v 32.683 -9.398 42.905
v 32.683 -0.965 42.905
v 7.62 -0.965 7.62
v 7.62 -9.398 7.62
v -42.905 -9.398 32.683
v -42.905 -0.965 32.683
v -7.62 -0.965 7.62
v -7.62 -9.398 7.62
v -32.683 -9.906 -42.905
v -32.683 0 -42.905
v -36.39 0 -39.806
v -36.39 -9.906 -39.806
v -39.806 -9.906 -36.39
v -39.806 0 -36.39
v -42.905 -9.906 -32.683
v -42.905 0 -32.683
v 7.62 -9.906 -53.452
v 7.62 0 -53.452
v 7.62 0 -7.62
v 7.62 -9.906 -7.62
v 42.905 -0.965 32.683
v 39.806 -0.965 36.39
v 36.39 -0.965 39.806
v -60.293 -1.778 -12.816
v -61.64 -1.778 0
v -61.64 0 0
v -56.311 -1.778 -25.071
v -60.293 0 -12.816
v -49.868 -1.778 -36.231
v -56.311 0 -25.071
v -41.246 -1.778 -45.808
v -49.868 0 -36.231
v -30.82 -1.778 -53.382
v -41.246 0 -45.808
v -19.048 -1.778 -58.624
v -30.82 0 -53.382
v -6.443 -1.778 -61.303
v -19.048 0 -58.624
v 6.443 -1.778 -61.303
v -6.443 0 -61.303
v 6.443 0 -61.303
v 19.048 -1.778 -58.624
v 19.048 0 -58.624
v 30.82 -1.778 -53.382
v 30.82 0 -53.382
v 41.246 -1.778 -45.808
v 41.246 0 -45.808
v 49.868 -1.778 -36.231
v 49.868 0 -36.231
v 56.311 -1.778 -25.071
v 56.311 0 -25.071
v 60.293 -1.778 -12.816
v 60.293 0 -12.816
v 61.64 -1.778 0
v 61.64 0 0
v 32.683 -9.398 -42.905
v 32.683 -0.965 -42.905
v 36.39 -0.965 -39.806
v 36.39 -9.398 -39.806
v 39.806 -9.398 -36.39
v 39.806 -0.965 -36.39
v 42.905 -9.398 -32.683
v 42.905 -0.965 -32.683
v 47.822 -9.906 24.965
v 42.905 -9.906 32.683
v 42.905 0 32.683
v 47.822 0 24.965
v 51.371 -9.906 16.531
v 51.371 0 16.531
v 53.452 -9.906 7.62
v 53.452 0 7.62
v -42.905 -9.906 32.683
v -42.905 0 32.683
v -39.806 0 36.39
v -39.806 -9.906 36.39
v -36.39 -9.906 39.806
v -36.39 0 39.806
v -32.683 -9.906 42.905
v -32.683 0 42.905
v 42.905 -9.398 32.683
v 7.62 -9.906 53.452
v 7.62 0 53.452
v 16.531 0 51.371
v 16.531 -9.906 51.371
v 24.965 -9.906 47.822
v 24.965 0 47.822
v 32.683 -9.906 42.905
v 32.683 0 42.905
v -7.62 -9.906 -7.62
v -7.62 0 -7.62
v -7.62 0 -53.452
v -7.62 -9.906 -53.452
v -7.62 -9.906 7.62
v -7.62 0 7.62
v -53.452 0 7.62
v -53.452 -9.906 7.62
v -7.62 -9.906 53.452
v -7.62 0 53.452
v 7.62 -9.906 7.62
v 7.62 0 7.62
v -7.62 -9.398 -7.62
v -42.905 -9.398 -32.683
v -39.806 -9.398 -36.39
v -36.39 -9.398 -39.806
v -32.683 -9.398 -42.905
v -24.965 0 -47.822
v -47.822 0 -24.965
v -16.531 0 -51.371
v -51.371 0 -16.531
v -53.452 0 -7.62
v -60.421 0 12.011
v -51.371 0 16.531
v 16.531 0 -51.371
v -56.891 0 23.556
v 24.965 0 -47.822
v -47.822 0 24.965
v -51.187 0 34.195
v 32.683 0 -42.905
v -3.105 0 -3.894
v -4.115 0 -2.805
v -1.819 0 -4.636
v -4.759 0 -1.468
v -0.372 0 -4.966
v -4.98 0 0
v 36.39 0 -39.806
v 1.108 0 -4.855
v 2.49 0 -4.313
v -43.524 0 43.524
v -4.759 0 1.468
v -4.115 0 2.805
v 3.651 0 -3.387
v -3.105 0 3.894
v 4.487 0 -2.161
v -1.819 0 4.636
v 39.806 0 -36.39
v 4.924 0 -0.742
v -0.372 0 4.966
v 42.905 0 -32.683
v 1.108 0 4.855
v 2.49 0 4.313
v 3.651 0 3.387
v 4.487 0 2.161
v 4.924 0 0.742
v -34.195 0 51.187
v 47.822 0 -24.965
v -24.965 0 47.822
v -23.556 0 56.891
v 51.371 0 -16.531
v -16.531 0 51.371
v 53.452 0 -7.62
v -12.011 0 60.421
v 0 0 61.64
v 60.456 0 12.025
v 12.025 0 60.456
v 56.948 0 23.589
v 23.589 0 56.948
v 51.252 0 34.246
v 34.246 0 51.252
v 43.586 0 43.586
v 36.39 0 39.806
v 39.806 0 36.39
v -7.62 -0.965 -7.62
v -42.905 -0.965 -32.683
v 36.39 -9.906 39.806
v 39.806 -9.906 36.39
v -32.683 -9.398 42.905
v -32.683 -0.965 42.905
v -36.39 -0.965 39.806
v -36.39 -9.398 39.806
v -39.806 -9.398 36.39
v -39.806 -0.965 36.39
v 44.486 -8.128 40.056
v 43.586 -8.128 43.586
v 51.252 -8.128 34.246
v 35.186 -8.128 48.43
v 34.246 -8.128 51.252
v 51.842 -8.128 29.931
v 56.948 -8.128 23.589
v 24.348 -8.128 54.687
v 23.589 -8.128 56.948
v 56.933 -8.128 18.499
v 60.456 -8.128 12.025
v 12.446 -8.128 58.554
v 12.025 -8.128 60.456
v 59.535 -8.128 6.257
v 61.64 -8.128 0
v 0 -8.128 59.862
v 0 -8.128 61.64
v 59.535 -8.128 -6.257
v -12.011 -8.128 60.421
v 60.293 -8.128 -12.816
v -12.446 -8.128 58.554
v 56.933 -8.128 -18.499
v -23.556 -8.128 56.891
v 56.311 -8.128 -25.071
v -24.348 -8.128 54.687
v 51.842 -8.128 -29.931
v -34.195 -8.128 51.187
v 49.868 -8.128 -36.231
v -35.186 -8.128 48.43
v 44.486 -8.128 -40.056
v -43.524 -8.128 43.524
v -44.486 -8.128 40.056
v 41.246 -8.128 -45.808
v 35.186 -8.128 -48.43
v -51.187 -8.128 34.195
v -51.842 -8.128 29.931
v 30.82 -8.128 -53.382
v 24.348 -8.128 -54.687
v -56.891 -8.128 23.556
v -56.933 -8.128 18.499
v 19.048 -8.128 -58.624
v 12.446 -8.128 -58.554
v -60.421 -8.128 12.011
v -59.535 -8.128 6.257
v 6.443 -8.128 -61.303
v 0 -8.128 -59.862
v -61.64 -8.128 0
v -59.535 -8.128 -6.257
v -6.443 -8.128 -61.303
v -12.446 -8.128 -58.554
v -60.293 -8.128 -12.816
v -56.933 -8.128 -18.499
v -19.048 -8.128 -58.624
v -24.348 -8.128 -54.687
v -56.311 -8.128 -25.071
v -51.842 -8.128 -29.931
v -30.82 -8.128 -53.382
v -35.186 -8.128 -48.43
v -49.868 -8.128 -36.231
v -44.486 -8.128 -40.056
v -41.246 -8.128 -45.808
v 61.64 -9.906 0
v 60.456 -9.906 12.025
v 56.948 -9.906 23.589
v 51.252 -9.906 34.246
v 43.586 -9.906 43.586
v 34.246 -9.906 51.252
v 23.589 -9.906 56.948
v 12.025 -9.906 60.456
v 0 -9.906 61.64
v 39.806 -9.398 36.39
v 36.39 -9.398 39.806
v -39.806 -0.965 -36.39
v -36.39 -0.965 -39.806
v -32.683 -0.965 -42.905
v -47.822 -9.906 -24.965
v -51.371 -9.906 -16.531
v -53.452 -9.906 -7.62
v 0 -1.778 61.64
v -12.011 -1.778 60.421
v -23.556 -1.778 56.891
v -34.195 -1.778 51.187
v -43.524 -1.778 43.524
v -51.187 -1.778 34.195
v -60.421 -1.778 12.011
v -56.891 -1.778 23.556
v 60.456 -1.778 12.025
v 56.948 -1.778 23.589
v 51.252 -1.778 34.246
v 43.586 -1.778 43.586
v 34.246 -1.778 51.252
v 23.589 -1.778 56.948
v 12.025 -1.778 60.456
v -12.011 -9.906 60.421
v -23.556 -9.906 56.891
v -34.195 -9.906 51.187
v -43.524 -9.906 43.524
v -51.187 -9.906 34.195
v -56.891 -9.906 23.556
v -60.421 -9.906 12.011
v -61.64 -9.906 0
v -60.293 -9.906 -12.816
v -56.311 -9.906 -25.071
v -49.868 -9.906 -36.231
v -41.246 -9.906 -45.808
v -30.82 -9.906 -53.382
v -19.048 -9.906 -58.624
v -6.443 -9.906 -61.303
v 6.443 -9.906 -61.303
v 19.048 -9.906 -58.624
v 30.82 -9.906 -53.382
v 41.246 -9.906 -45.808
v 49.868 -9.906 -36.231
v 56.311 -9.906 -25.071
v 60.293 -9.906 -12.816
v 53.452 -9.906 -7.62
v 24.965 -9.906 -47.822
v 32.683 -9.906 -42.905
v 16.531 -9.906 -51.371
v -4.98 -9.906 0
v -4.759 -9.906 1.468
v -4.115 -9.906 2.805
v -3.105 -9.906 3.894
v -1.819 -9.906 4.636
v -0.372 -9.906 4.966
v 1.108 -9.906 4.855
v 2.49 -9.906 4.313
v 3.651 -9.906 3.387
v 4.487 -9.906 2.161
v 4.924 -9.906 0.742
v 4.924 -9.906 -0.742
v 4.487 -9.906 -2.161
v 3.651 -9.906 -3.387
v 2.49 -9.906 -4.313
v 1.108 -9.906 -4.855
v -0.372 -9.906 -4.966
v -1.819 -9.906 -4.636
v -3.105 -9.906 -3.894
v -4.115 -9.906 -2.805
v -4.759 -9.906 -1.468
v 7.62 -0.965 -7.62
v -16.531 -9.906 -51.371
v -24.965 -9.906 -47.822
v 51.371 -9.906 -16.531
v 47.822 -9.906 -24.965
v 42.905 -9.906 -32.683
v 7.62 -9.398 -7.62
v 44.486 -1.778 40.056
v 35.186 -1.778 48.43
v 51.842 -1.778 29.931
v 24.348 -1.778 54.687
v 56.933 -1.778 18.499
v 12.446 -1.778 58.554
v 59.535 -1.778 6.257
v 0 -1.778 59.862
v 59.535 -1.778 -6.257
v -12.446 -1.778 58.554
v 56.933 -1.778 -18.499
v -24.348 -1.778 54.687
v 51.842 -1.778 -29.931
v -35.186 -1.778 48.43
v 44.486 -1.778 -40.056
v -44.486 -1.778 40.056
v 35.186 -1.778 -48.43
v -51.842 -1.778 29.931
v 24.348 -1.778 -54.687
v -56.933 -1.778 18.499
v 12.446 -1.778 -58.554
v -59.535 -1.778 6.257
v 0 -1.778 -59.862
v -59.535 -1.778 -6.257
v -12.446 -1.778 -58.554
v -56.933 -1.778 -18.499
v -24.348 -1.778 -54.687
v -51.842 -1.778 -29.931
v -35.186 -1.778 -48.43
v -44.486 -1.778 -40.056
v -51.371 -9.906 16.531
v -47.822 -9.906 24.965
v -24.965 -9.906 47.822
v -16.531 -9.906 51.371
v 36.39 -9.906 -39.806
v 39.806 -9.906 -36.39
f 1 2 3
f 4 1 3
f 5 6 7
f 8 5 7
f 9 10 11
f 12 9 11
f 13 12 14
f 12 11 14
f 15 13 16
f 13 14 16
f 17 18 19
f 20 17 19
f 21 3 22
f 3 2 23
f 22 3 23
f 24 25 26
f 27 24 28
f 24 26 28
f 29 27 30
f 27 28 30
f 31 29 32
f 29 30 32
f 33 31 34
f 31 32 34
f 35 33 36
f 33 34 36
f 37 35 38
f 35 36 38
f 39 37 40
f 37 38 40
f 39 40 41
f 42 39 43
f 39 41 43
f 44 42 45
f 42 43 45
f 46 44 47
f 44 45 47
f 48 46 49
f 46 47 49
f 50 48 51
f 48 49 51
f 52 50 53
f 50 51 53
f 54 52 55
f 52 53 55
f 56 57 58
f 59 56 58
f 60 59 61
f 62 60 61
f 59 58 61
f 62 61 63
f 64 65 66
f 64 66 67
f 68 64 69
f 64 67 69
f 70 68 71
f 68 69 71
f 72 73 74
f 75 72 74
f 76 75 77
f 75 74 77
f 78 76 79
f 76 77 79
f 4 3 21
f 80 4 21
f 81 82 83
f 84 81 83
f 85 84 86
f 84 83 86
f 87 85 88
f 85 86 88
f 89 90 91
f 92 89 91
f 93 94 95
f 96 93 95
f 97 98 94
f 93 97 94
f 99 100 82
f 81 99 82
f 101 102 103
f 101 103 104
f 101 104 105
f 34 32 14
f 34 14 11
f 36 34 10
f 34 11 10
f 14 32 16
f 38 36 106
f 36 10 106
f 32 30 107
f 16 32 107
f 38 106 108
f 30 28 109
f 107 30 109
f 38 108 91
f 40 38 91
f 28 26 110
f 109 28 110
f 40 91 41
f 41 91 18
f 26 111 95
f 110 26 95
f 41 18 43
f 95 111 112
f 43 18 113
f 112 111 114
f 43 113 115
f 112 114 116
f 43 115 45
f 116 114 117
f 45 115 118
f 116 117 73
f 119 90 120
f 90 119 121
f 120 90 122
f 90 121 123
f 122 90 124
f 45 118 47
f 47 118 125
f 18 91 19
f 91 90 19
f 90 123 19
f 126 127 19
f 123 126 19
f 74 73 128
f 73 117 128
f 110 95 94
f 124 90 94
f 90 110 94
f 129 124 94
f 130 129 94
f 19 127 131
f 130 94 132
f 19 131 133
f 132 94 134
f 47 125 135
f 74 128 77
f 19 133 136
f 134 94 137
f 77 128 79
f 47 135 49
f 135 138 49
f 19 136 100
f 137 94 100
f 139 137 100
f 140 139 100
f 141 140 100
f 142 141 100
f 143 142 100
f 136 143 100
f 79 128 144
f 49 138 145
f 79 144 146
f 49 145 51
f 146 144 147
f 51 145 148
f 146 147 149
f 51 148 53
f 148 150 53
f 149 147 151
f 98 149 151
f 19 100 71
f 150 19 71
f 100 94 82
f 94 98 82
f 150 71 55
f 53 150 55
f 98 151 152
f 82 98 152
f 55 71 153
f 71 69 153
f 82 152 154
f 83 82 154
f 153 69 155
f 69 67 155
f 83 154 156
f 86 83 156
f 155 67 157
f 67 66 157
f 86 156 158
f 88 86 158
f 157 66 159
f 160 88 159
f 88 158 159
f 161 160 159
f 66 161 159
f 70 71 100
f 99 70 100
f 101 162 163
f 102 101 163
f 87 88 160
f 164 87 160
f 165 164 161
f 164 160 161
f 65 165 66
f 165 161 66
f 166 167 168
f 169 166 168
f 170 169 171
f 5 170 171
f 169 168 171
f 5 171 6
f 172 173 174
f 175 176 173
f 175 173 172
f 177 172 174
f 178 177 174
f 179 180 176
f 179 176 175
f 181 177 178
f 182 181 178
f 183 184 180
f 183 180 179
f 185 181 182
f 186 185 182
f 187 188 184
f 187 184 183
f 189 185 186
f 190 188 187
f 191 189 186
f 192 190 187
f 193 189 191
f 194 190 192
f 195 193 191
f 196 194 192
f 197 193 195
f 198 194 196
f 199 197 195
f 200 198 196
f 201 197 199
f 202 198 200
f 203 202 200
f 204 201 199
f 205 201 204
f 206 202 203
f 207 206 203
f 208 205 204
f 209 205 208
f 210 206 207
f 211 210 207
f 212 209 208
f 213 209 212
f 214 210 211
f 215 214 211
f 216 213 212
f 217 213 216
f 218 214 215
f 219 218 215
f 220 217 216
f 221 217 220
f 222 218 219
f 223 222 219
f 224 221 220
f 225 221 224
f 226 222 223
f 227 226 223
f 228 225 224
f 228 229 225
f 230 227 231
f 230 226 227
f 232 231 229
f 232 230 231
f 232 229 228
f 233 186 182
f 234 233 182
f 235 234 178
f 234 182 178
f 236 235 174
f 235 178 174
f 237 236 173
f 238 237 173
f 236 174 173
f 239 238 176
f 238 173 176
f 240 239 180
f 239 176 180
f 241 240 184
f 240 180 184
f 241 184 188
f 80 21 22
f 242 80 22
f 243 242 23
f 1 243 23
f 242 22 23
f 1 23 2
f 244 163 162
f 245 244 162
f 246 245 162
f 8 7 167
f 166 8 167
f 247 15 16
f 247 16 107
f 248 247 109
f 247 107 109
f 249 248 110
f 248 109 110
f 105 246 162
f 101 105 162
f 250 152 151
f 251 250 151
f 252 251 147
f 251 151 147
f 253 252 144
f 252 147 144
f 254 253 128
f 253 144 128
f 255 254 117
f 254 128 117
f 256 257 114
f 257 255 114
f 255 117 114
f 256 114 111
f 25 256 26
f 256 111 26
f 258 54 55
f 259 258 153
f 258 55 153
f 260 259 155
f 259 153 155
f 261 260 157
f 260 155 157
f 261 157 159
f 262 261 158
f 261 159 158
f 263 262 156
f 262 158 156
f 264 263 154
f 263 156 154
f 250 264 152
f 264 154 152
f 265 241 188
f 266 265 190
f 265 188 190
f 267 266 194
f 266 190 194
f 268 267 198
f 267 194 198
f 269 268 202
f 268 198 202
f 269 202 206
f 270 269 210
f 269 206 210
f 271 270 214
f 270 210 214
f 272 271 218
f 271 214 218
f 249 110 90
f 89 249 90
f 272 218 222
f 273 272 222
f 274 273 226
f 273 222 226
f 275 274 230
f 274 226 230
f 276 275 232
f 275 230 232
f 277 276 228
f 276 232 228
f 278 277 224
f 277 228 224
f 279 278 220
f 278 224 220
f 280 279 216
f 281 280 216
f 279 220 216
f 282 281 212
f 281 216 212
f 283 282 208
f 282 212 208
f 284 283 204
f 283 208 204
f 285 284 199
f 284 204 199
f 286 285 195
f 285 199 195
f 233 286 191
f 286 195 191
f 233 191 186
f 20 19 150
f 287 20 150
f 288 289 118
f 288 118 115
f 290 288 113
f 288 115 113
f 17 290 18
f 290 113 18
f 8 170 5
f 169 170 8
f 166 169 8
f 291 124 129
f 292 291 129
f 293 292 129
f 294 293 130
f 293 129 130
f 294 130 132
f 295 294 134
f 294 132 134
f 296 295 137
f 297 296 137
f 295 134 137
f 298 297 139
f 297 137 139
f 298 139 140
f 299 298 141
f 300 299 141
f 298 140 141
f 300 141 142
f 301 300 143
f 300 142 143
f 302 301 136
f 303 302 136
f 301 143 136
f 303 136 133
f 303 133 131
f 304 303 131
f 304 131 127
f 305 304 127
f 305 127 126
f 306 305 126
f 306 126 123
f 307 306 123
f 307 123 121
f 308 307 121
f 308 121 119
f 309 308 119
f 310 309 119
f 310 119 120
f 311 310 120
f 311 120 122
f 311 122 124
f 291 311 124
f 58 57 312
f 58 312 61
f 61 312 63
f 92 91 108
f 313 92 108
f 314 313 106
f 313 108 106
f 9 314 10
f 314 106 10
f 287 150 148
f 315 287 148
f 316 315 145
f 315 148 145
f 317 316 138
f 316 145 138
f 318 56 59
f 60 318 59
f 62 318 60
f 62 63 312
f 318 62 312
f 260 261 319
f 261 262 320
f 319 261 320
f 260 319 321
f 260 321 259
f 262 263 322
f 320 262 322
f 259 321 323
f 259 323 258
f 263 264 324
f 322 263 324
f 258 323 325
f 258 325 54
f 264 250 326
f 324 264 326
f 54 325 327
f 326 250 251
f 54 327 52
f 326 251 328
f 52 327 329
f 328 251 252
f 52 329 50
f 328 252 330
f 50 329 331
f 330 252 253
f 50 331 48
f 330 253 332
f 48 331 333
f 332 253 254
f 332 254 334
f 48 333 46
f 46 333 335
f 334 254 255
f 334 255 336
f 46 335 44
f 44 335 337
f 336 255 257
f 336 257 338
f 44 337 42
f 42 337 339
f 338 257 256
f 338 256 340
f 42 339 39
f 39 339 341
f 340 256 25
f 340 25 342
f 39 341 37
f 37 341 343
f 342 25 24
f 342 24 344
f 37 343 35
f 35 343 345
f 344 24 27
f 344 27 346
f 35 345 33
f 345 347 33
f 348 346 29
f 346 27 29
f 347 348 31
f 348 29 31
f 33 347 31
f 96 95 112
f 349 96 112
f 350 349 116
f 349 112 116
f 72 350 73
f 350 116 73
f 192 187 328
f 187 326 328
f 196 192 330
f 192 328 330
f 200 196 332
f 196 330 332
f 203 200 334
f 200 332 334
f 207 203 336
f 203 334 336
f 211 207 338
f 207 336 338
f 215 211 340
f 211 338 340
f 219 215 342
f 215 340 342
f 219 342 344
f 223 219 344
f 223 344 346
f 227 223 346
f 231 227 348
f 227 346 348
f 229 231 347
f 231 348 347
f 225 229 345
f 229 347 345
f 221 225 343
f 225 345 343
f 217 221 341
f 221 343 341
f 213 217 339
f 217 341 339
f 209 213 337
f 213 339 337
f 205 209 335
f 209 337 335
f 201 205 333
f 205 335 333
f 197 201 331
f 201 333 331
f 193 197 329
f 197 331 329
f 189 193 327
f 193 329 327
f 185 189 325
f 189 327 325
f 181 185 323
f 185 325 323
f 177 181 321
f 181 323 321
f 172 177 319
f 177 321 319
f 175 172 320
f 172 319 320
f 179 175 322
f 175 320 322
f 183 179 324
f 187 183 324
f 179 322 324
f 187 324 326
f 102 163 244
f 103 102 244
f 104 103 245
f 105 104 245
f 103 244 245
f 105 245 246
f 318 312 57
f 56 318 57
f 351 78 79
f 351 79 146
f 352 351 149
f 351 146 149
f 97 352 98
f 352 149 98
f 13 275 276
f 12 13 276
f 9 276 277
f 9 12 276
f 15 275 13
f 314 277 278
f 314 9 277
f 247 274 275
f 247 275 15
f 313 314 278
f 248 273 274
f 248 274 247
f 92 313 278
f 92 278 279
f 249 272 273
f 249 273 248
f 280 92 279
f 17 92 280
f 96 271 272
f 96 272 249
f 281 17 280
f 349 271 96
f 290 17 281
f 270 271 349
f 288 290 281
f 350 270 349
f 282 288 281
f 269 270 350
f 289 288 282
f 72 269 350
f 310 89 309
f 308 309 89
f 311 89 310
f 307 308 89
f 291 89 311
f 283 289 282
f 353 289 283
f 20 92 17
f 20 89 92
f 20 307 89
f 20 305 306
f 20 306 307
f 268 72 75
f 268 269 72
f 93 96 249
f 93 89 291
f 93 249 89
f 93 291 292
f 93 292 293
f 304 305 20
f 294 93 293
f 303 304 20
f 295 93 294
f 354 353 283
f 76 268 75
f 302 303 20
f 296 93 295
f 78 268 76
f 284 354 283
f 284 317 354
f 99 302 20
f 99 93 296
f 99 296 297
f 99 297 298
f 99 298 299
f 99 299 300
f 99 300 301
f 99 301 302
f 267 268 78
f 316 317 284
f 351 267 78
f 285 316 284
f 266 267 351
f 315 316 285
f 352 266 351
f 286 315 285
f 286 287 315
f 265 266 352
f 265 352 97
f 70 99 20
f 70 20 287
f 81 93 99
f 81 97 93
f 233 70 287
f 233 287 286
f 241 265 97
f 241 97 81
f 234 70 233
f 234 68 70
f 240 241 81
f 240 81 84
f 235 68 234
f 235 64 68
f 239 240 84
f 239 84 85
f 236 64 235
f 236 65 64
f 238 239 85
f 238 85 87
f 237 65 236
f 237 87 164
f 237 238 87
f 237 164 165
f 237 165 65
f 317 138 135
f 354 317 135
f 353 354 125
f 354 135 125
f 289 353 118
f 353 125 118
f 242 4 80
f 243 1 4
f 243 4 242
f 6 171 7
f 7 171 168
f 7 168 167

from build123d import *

# Parameters (mm, degrees)
F1_DEPTH = 9.906
F2_R     = 4.9801152189
F3_DEPTH = 25.4
F4_START = 0.9652
F4_DEPTH = 8.4328
F5_W     = 6.35
F5_H     = 1.778


with BuildPart() as f1:
    # F0 (on Front) → F1 (new body)
    with BuildSketch(Plane.XZ):
        with BuildLine():
            Line((0, 0), (0, 61.6404471462))
            ThreePointArc((0, 61.6404471462), (-43.5239509261, 43.5239509261), (-61.6404471462, 0))
            Line((-61.6404471462, 0), (0, 0))
        make_face()
        with BuildLine():
            ThreePointArc((-32.6825445587, 42.9048036652), (-20.8229984577, 49.7745877791), (-7.620000662, 53.4520348147))
            Line((-7.620000662, 53.4520348147), (-7.620000662, 7.620000662))
            Line((-7.620000662, 7.620000662), (-53.4520348147, 7.620000662))
            ThreePointArc((-53.4520348147, 7.620000662), (-49.7745877791, 20.8229984577), (-42.9048036652, 32.6825445587))
            ThreePointArc((-42.9048036652, 32.6825445587), (-38.1357967854, 38.1357967854), (-32.6825445587, 42.9048036652))
        make_face(mode=Mode.SUBTRACT)
        with BuildLine():
            ThreePointArc((-61.6404471462, 0), (0, -61.6404471462), (61.6404471462, 0))
            ThreePointArc((61.6404471462, 0), (43.5863781724, 43.5863781724), (0, 61.6404471462))
            Line((0, 61.6404471462), (0, 0))
            Line((0, 0), (-61.6404471462, 0))
        make_face()
        with BuildLine():
            ThreePointArc((-42.9048036652, -32.6825445587), (-49.7745877791, -20.8229984577), (-53.4520348147, -7.620000662))
            Line((-53.4520348147, -7.620000662), (-7.620000662, -7.620000662))
            Line((-7.620000662, -7.620000662), (-7.620000662, -53.4520348147))
            ThreePointArc((-7.620000662, -53.4520348147), (-20.8229984577, -49.7745877791), (-32.6825445587, -42.9048036652))
            ThreePointArc((-32.6825445587, -42.9048036652), (-38.1357967854, -38.1357967854), (-42.9048036652, -32.6825445587))
        make_face(mode=Mode.SUBTRACT)
        with BuildLine():
            ThreePointArc((32.6825445587, -42.9048036652), (20.8229984577, -49.7745877791), (7.620000662, -53.4520348147))
            Line((7.620000662, -53.4520348147), (7.620000662, -7.620000662))
            Line((7.620000662, -7.620000662), (53.4520348147, -7.620000662))
            ThreePointArc((53.4520348147, -7.620000662), (49.7745877791, -20.8229984577), (42.9048036652, -32.6825445587))
            ThreePointArc((42.9048036652, -32.6825445587), (38.1357967854, -38.1357967854), (32.6825445587, -42.9048036652))
        make_face(mode=Mode.SUBTRACT)
        with BuildLine():
            ThreePointArc((42.9048036652, 32.6825445587), (49.7745877791, 20.8229984577), (53.4520348147, 7.620000662))
            Line((53.4520348147, 7.620000662), (7.620000662, 7.620000662))
            Line((7.620000662, 7.620000662), (7.620000662, 53.4520348147))
            ThreePointArc((7.620000662, 53.4520348147), (20.8229984577, 49.7745877791), (32.6825445587, 42.9048036652))
            ThreePointArc((32.6825445587, 42.9048036652), (38.1357967854, 38.1357967854), (42.9048036652, 32.6825445587))
        make_face(mode=Mode.SUBTRACT)
    extrude(amount=F1_DEPTH)

    # F2 (on face) → F3 (cut)
    with BuildSketch(Plane(origin=(0, 0, 0), x_dir=(-1, 0, 0), z_dir=(0, 1, 0))):
        Circle(F2_R)
    extrude(amount=-F3_DEPTH, mode=Mode.SUBTRACT)

    # F5 (on Right) → F6 (revolve, cut)
    with BuildSketch(Plane.YZ):
        with Locations((-4.953, 60.7514471462)):
            Rectangle(F5_W, F5_H)
    revolve(axis=Axis((0, -19.4112598596, 0), (0, -1, 0)), mode=Mode.SUBTRACT)


with BuildPart() as f4:
    # F0 (on Front) → F4 (new body)
    with BuildSketch(Plane.XZ.offset(F4_START)):
        with BuildLine():
            Line((-7.620000662, 7.620000662), (-32.6825445587, 42.9048036652))
            ThreePointArc((-32.6825445587, 42.9048036652), (-38.1357967854, 38.1357967854), (-42.9048036652, 32.6825445587))
            Line((-42.9048036652, 32.6825445587), (-7.620000662, 7.620000662))
        make_face()
    extrude(amount=F4_DEPTH)


with BuildPart() as f4b:
    # F0 (on Front) → F4, piece 2 (new body)
    with BuildSketch(Plane.XZ.offset(F4_START)):
        with BuildLine():
            Line((-7.620000662, -7.620000662), (-42.9048036652, -32.6825445587))
            ThreePointArc((-42.9048036652, -32.6825445587), (-38.1357967854, -38.1357967854), (-32.6825445587, -42.9048036652))
            Line((-32.6825445587, -42.9048036652), (-7.620000662, -7.620000662))
        make_face()
    extrude(amount=F4_DEPTH)


with BuildPart() as f4c:
    # F0 (on Front) → F4, piece 3 (new body)
    with BuildSketch(Plane.XZ.offset(F4_START)):
        with BuildLine():
            Line((7.620000662, -7.620000662), (32.6825445587, -42.9048036652))
            ThreePointArc((32.6825445587, -42.9048036652), (38.1357967854, -38.1357967854), (42.9048036652, -32.6825445587))
            Line((42.9048036652, -32.6825445587), (7.620000662, -7.620000662))
        make_face()
    extrude(amount=F4_DEPTH)


with BuildPart() as f4d:
    # F0 (on Front) → F4, piece 4 (new body)
    with BuildSketch(Plane.XZ.offset(F4_START)):
        with BuildLine():
            Line((7.620000662, 7.620000662), (42.9048036652, 32.6825445587))
            ThreePointArc((42.9048036652, 32.6825445587), (38.1357967854, 38.1357967854), (32.6825445587, 42.9048036652))
            Line((32.6825445587, 42.9048036652), (7.620000662, 7.620000662))
        make_face()
    extrude(amount=F4_DEPTH)


solid = Compound([f1.part, f4.part, f4b.part, f4c.part, f4d.part])
